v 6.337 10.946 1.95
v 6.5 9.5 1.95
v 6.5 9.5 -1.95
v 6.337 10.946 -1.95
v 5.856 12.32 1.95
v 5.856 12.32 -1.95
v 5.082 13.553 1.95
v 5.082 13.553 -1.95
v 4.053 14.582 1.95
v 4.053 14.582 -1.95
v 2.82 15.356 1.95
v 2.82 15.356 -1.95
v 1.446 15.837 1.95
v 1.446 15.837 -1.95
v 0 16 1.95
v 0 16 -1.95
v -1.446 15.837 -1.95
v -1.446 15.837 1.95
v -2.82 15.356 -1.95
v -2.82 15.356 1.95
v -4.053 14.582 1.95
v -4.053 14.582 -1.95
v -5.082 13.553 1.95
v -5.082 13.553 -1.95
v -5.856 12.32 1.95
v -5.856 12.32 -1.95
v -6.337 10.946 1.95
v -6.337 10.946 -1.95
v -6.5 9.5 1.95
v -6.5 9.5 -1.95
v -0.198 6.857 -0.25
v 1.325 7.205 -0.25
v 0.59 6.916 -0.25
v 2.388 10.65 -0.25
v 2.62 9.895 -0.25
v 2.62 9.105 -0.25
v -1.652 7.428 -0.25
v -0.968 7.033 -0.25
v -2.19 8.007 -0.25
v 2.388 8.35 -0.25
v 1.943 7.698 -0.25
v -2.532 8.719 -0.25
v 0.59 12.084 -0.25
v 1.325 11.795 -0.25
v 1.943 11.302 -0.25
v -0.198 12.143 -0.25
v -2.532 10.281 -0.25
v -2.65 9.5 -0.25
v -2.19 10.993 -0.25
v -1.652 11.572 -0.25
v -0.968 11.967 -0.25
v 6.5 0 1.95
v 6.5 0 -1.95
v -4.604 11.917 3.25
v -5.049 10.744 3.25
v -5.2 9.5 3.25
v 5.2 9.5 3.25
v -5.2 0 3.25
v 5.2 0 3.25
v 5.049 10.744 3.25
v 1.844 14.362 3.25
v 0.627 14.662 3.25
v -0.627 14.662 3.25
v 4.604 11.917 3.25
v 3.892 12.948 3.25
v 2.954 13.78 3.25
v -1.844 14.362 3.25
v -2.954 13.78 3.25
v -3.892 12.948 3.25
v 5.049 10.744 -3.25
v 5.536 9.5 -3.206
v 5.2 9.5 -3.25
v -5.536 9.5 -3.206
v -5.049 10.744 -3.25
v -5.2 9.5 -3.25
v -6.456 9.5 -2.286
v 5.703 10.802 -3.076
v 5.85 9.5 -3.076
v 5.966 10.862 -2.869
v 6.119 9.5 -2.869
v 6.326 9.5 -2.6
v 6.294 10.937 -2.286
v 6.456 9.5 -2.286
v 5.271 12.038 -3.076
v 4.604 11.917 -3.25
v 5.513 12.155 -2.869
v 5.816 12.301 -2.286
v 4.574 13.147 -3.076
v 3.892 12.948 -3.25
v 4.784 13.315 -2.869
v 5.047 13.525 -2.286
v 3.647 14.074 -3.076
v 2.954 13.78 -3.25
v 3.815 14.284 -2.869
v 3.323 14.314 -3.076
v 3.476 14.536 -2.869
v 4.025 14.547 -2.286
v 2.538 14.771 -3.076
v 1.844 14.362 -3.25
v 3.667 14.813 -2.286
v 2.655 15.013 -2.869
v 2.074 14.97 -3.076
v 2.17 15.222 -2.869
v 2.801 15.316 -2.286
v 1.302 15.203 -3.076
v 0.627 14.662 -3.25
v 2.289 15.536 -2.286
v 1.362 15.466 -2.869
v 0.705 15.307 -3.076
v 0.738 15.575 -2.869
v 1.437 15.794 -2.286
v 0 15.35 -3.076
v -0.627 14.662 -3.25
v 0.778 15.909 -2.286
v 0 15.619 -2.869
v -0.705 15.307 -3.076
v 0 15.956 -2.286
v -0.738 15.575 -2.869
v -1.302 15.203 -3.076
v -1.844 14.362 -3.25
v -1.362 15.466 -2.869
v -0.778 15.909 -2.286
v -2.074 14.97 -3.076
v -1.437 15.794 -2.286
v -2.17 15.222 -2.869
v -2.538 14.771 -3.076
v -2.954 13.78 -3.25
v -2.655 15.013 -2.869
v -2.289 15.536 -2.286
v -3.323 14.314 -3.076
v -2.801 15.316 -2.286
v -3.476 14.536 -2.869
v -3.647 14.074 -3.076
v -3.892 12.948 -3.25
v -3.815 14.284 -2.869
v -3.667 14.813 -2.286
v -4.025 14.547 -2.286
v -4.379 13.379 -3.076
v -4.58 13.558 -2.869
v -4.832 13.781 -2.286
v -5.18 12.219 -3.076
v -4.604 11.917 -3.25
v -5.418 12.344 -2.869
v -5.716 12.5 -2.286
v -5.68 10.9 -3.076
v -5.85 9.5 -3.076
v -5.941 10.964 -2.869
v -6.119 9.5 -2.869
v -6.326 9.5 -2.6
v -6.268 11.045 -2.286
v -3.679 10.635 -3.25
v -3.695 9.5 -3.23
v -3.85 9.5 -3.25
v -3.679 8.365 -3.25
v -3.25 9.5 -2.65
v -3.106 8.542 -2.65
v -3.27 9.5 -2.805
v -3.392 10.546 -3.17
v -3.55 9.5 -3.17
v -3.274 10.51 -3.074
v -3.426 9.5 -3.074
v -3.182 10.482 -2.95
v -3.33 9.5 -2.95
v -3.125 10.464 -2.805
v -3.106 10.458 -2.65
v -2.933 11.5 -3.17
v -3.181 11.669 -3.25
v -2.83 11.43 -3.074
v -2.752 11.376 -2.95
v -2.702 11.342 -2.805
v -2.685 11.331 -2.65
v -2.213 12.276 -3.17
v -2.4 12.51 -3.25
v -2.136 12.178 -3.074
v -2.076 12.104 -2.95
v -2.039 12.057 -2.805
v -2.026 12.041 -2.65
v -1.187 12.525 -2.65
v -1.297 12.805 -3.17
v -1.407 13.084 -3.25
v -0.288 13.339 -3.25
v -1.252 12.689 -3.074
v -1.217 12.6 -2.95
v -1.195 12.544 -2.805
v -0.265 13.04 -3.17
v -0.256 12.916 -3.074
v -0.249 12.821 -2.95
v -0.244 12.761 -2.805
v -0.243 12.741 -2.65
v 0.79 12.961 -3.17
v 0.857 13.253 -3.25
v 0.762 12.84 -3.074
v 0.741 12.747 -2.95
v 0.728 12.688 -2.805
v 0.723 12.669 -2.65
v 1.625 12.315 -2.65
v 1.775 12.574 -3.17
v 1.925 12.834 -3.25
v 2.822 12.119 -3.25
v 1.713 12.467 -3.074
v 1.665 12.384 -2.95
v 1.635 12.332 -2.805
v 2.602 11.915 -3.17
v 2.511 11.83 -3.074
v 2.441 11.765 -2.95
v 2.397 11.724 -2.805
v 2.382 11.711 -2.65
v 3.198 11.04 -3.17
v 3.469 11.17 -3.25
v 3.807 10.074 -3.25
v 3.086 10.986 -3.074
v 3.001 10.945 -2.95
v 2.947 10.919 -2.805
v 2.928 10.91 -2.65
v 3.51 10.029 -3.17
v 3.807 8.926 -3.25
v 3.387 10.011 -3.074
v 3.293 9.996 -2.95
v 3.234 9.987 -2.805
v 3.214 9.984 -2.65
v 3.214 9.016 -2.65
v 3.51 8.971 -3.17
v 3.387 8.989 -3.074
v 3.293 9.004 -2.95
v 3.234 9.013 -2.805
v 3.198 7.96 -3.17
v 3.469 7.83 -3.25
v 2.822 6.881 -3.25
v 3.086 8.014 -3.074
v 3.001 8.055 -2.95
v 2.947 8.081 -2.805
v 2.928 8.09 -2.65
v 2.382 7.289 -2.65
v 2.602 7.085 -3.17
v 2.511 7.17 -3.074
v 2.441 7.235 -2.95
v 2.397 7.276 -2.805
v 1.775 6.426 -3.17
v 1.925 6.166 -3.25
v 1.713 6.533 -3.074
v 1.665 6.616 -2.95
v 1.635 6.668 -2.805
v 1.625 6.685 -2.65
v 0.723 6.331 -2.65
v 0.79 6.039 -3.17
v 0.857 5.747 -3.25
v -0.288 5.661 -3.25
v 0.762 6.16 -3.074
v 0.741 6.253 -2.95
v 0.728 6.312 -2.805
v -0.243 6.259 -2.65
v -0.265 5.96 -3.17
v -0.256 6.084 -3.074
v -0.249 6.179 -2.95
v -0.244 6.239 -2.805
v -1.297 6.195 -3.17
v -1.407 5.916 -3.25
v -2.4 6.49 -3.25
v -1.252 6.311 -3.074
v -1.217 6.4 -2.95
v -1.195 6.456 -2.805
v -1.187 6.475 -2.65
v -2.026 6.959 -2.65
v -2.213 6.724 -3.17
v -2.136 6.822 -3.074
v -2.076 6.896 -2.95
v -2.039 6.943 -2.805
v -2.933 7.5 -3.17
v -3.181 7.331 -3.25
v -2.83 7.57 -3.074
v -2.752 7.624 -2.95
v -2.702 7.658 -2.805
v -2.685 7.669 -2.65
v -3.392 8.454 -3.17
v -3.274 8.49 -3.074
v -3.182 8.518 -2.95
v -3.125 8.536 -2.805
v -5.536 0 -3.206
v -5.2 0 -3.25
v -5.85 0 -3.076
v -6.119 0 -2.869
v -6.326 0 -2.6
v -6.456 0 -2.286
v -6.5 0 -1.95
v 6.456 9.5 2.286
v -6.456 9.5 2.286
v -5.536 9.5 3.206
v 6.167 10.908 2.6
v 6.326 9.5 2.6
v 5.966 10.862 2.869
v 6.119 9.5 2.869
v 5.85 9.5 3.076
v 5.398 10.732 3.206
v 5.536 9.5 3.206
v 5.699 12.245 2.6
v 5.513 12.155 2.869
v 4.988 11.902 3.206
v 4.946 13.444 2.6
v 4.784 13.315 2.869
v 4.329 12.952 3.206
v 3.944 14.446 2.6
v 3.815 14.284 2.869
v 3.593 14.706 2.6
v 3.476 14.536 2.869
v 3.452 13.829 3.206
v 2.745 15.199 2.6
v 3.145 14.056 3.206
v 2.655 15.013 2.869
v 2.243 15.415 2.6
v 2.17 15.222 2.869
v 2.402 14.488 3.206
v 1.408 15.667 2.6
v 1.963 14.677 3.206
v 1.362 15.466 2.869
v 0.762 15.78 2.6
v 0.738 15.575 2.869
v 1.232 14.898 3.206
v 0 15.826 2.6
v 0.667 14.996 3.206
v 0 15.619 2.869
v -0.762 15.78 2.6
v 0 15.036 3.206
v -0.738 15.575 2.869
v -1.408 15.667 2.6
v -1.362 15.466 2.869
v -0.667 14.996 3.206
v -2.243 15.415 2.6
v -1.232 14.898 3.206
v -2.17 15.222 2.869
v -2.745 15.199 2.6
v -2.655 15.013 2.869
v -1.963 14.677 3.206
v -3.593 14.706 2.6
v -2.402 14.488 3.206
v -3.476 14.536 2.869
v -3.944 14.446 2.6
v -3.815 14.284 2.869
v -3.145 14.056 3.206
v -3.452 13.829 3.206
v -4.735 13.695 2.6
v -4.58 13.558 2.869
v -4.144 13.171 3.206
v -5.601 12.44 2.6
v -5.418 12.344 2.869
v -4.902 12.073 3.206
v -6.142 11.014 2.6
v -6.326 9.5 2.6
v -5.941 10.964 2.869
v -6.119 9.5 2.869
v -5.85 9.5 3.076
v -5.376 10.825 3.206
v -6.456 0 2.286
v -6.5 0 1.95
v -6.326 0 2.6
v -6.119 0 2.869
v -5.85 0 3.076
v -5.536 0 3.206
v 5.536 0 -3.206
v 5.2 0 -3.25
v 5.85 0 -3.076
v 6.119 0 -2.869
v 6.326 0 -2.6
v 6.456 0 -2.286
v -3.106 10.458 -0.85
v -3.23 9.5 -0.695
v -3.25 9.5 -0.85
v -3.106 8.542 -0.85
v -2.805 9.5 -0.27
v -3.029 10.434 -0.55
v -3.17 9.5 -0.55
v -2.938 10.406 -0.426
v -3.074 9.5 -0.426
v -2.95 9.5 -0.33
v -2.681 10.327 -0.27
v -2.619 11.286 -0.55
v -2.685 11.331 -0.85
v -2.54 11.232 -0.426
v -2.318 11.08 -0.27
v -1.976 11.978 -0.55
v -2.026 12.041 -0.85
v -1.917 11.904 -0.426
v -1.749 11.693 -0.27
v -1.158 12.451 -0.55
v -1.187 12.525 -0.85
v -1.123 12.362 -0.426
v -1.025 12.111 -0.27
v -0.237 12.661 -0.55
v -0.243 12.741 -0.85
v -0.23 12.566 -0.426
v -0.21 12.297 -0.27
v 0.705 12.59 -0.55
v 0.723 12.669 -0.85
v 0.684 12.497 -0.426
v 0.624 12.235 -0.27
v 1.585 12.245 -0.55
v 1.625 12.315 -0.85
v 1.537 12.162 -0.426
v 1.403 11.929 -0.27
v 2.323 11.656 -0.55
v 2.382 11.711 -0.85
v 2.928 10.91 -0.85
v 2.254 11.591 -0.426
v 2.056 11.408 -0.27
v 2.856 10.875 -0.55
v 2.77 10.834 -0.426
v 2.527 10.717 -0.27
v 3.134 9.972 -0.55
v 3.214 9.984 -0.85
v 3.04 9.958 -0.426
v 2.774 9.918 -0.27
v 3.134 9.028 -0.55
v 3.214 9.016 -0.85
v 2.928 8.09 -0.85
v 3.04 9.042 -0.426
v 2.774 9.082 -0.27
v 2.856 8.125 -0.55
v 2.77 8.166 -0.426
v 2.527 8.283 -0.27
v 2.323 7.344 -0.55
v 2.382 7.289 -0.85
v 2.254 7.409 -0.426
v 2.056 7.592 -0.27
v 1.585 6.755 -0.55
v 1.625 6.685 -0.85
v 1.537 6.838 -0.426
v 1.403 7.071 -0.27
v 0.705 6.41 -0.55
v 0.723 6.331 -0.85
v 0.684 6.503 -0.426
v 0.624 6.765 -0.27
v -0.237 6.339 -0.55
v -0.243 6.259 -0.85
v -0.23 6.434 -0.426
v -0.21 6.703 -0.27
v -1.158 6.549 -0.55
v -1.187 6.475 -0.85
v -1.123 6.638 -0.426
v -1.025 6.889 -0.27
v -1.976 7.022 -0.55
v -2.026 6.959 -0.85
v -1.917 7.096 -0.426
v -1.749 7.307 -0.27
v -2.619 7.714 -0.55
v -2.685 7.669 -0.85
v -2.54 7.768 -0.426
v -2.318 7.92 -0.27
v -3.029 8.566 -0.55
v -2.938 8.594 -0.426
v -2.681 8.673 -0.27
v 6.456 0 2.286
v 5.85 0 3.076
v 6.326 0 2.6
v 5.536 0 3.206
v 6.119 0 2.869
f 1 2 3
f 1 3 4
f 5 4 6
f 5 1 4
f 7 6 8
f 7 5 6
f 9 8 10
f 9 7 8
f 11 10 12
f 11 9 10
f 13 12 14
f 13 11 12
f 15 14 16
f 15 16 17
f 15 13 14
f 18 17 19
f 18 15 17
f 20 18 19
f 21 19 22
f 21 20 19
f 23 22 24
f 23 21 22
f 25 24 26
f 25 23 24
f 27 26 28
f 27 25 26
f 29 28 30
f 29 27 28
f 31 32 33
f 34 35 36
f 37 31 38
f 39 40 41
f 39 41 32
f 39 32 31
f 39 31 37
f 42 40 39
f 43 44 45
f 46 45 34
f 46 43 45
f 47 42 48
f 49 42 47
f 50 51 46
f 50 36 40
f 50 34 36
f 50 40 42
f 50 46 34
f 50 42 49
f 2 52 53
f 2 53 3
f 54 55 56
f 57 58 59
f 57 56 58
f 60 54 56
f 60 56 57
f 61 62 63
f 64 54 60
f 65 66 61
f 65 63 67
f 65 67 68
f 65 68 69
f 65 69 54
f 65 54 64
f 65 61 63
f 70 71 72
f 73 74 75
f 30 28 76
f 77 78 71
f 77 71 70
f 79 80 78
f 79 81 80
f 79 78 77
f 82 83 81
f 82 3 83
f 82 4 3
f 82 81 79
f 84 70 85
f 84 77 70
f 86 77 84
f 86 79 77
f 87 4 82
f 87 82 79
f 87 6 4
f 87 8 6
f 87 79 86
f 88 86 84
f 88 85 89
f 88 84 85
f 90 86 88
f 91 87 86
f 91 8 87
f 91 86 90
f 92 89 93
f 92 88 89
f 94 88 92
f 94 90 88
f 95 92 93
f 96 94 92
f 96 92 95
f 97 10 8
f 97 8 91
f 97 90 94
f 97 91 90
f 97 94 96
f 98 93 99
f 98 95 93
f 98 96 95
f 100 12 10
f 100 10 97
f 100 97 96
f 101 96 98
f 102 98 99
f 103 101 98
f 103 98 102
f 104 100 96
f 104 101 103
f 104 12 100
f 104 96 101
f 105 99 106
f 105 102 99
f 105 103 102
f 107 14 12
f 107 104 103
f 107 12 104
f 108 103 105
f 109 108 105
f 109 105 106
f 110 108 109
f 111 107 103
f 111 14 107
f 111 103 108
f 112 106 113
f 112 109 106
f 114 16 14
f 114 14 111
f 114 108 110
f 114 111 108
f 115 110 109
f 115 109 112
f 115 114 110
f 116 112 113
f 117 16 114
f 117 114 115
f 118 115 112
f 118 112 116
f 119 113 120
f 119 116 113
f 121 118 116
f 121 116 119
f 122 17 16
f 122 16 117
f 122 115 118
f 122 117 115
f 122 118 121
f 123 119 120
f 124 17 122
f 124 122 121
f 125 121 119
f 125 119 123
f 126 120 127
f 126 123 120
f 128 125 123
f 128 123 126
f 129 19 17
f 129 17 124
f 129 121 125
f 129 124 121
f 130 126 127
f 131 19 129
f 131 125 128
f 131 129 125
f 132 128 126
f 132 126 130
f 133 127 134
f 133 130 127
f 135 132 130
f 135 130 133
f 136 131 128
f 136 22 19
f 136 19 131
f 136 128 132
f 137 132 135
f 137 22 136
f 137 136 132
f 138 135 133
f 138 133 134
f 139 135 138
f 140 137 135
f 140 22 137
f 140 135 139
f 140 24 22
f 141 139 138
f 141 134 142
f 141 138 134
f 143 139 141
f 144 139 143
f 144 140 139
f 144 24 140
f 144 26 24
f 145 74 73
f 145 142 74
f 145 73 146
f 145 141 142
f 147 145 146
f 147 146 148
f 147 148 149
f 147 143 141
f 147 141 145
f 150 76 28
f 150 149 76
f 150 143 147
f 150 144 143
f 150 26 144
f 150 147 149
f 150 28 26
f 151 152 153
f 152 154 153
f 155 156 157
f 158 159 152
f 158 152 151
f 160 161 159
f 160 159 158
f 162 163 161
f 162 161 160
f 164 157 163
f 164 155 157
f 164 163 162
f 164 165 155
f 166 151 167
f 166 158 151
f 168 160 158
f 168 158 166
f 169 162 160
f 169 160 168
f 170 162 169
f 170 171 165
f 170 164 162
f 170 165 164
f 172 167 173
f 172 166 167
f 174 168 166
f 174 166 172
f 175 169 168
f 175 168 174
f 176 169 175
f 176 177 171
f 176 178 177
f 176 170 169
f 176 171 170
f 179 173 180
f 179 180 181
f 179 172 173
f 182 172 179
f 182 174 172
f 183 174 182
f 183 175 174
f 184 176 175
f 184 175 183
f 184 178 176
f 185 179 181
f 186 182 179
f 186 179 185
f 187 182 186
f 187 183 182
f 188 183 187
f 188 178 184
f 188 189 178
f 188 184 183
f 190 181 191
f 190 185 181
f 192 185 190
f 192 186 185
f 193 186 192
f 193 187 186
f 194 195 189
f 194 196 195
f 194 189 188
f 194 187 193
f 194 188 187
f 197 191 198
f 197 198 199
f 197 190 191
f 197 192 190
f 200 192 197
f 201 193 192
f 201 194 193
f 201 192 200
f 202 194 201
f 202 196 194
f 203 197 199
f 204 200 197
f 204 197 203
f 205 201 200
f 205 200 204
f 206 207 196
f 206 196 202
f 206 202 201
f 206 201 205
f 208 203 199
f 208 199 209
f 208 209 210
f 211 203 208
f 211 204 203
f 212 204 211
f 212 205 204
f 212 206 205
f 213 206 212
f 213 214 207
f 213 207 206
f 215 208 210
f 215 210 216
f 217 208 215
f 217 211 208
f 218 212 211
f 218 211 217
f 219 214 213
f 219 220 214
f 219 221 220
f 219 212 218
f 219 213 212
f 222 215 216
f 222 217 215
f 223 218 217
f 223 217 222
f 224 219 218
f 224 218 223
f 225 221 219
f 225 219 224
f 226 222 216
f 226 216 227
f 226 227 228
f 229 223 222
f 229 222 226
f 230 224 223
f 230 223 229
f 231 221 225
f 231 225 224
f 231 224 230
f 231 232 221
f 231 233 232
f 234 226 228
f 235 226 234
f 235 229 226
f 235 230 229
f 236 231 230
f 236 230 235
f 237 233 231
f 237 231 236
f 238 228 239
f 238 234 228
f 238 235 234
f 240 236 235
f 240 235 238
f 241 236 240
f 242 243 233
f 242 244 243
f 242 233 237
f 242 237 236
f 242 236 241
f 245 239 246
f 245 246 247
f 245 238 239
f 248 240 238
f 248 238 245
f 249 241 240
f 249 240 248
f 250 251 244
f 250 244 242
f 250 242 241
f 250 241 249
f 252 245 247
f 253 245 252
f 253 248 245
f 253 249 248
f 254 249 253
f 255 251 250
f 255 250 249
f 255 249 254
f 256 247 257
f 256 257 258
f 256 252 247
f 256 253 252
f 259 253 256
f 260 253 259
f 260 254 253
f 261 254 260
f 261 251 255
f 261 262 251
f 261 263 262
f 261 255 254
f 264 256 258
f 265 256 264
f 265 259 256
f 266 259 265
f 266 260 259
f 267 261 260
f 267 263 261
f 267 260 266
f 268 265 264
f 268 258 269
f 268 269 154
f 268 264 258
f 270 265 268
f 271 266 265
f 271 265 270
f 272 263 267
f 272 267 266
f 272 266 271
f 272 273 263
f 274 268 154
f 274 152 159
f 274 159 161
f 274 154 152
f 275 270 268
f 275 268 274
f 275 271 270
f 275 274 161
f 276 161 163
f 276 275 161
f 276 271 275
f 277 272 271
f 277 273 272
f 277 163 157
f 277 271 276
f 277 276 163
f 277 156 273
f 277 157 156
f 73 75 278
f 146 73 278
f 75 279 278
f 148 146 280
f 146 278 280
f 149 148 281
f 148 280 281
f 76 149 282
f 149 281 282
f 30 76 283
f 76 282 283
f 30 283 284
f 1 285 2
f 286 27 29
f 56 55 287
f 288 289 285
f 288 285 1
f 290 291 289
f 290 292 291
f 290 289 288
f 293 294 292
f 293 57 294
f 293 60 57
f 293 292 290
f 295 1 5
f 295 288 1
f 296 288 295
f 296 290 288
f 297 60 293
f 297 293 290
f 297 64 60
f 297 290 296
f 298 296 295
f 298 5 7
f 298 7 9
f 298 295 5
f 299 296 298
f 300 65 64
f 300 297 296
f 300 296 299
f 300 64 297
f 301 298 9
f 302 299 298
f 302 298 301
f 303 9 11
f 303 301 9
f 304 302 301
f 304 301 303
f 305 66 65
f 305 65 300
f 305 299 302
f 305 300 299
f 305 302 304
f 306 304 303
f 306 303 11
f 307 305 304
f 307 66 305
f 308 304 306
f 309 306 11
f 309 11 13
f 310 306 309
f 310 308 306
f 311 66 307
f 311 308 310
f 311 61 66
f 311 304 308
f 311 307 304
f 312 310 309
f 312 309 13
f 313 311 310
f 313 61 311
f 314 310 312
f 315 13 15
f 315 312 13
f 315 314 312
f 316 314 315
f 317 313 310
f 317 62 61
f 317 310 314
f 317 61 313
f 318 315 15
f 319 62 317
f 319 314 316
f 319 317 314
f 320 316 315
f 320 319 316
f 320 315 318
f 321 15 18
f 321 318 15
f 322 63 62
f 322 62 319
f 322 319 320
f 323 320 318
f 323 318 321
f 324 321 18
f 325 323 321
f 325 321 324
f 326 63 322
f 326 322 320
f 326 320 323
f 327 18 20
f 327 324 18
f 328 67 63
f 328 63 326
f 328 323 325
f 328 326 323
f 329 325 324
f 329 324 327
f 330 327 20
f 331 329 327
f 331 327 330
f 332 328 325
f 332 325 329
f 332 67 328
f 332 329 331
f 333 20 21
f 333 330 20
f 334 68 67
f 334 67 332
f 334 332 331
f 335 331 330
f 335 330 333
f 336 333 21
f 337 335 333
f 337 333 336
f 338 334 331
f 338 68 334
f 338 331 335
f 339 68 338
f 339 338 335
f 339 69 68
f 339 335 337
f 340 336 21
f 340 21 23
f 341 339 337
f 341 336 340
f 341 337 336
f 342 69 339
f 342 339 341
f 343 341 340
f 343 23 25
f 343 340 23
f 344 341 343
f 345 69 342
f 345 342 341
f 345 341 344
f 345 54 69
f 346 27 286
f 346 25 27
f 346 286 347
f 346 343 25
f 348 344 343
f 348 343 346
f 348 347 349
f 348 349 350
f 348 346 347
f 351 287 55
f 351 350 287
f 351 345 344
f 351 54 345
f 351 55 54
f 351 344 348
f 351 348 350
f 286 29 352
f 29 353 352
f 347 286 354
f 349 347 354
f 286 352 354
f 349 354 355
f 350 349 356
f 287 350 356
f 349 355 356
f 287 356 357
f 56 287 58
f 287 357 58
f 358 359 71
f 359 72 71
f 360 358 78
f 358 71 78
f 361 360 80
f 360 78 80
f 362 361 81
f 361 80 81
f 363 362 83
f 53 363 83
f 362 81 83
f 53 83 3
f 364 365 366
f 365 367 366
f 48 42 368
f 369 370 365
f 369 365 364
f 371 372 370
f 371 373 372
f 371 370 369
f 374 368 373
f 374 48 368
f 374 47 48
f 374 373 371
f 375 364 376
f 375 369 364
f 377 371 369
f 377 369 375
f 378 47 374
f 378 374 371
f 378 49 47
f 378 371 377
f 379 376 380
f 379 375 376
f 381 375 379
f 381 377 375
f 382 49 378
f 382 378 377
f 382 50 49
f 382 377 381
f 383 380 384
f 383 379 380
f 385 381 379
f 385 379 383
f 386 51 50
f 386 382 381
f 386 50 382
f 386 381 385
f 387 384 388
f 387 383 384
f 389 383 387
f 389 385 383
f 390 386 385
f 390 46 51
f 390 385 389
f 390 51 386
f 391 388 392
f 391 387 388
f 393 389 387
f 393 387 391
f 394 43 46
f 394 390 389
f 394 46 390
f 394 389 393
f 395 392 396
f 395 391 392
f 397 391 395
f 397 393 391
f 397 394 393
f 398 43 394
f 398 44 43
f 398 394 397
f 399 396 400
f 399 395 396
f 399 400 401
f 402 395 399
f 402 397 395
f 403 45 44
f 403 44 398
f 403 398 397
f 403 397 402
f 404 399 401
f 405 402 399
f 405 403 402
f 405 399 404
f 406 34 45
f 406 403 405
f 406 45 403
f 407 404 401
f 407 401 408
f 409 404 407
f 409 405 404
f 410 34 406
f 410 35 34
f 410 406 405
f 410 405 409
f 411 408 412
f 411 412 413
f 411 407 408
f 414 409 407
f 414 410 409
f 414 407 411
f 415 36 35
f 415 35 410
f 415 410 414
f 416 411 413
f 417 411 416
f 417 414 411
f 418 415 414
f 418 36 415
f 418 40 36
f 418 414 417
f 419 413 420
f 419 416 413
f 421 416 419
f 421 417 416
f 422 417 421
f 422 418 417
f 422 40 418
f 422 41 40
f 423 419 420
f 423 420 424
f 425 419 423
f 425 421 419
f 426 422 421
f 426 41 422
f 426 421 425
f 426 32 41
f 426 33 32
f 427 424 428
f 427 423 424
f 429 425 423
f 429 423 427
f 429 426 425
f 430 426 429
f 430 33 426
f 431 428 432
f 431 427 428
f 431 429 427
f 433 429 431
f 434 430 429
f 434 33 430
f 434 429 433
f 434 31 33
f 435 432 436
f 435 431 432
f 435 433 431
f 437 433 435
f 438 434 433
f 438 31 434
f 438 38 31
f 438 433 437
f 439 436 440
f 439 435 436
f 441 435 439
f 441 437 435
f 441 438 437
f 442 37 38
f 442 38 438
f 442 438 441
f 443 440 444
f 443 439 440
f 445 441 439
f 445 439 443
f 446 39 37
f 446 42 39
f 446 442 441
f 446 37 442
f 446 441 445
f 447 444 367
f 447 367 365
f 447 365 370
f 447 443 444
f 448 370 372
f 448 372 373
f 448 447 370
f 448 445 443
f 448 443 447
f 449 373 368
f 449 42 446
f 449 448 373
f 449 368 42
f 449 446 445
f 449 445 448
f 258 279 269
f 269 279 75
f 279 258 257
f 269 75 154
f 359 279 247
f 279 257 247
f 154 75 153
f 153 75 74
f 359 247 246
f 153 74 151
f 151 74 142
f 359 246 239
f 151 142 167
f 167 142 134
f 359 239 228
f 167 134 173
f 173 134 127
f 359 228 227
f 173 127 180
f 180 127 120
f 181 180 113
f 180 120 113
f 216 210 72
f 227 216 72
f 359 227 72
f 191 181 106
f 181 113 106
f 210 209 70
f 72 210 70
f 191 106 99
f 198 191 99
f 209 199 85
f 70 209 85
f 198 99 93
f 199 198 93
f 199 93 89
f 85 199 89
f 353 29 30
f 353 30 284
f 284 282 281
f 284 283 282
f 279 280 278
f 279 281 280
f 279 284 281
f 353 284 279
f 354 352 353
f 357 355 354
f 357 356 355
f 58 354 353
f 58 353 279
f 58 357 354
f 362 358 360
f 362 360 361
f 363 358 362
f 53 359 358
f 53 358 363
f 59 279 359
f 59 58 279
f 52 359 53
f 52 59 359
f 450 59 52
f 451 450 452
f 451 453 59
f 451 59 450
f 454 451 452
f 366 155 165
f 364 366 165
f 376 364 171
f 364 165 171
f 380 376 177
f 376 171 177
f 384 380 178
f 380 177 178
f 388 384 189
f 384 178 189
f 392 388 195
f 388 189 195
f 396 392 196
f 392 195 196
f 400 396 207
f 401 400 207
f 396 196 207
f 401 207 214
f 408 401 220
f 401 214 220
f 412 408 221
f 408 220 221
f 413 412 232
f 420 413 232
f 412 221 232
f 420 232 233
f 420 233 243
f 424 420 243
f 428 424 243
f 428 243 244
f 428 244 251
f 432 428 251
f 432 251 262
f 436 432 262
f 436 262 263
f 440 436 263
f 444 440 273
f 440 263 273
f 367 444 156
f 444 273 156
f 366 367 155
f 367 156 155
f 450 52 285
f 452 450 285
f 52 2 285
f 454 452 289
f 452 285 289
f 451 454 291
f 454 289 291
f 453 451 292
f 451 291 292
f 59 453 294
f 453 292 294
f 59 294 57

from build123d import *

# Parameters (mm, degrees)
BASE_EXTRUDE_DEPTH = 3.25
SKETCH2_R          = 3.25
CUT_EXTRUDE1_DEPTH = 3
FILLET1_R          = 1.3
FILLET2_R          = 0.6


with BuildPart() as part:
    # Sketch1 → Base-Extrude (new, symmetric)
    with BuildSketch(Plane.XY):
        with BuildLine():
            Line((-6.5, 0), (6.5, 0))
            Line((6.5, 0), (6.5, 9.5))
            ThreePointArc((6.5, 9.5), (0, 16), (-6.5, 9.5))
            Line((-6.5, 9.5), (-6.5, 0))
        make_face()
    extrude(amount=BASE_EXTRUDE_DEPTH, both=True)

    # Sketch2 → Cut-Extrude1 (cut)
    with BuildSketch(Plane(origin=(0, 0, -3.25), x_dir=(-1, 0, 0), z_dir=(0, 0, -1))):
        with Locations((0, 9.5)):
            Circle(SKETCH2_R)
    extrude(amount=-CUT_EXTRUDE1_DEPTH, mode=Mode.SUBTRACT)

    # Fillet1
    fillet1_edges = [part.edges().sort_by_distance(p)[0] for p in [
        (6.5, 4.75, 3.25),
        (0, 16, 3.25),
        (-6.5, 4.75, 3.25),
        (0, 16, -3.25),
        (6.5, 4.75, -3.25),
        (-6.5, 4.75, -3.25),
    ]]
    fillet(fillet1_edges, radius=FILLET1_R)

    # Fillet2
    fillet2_edges = [part.edges().sort_by_distance(p)[0] for p in [
        (3.25, 9.5, -0.25),
        (3.25, 9.5, -3.25),
    ]]
    fillet(fillet2_edges, radius=FILLET2_R)


solid = part.part
